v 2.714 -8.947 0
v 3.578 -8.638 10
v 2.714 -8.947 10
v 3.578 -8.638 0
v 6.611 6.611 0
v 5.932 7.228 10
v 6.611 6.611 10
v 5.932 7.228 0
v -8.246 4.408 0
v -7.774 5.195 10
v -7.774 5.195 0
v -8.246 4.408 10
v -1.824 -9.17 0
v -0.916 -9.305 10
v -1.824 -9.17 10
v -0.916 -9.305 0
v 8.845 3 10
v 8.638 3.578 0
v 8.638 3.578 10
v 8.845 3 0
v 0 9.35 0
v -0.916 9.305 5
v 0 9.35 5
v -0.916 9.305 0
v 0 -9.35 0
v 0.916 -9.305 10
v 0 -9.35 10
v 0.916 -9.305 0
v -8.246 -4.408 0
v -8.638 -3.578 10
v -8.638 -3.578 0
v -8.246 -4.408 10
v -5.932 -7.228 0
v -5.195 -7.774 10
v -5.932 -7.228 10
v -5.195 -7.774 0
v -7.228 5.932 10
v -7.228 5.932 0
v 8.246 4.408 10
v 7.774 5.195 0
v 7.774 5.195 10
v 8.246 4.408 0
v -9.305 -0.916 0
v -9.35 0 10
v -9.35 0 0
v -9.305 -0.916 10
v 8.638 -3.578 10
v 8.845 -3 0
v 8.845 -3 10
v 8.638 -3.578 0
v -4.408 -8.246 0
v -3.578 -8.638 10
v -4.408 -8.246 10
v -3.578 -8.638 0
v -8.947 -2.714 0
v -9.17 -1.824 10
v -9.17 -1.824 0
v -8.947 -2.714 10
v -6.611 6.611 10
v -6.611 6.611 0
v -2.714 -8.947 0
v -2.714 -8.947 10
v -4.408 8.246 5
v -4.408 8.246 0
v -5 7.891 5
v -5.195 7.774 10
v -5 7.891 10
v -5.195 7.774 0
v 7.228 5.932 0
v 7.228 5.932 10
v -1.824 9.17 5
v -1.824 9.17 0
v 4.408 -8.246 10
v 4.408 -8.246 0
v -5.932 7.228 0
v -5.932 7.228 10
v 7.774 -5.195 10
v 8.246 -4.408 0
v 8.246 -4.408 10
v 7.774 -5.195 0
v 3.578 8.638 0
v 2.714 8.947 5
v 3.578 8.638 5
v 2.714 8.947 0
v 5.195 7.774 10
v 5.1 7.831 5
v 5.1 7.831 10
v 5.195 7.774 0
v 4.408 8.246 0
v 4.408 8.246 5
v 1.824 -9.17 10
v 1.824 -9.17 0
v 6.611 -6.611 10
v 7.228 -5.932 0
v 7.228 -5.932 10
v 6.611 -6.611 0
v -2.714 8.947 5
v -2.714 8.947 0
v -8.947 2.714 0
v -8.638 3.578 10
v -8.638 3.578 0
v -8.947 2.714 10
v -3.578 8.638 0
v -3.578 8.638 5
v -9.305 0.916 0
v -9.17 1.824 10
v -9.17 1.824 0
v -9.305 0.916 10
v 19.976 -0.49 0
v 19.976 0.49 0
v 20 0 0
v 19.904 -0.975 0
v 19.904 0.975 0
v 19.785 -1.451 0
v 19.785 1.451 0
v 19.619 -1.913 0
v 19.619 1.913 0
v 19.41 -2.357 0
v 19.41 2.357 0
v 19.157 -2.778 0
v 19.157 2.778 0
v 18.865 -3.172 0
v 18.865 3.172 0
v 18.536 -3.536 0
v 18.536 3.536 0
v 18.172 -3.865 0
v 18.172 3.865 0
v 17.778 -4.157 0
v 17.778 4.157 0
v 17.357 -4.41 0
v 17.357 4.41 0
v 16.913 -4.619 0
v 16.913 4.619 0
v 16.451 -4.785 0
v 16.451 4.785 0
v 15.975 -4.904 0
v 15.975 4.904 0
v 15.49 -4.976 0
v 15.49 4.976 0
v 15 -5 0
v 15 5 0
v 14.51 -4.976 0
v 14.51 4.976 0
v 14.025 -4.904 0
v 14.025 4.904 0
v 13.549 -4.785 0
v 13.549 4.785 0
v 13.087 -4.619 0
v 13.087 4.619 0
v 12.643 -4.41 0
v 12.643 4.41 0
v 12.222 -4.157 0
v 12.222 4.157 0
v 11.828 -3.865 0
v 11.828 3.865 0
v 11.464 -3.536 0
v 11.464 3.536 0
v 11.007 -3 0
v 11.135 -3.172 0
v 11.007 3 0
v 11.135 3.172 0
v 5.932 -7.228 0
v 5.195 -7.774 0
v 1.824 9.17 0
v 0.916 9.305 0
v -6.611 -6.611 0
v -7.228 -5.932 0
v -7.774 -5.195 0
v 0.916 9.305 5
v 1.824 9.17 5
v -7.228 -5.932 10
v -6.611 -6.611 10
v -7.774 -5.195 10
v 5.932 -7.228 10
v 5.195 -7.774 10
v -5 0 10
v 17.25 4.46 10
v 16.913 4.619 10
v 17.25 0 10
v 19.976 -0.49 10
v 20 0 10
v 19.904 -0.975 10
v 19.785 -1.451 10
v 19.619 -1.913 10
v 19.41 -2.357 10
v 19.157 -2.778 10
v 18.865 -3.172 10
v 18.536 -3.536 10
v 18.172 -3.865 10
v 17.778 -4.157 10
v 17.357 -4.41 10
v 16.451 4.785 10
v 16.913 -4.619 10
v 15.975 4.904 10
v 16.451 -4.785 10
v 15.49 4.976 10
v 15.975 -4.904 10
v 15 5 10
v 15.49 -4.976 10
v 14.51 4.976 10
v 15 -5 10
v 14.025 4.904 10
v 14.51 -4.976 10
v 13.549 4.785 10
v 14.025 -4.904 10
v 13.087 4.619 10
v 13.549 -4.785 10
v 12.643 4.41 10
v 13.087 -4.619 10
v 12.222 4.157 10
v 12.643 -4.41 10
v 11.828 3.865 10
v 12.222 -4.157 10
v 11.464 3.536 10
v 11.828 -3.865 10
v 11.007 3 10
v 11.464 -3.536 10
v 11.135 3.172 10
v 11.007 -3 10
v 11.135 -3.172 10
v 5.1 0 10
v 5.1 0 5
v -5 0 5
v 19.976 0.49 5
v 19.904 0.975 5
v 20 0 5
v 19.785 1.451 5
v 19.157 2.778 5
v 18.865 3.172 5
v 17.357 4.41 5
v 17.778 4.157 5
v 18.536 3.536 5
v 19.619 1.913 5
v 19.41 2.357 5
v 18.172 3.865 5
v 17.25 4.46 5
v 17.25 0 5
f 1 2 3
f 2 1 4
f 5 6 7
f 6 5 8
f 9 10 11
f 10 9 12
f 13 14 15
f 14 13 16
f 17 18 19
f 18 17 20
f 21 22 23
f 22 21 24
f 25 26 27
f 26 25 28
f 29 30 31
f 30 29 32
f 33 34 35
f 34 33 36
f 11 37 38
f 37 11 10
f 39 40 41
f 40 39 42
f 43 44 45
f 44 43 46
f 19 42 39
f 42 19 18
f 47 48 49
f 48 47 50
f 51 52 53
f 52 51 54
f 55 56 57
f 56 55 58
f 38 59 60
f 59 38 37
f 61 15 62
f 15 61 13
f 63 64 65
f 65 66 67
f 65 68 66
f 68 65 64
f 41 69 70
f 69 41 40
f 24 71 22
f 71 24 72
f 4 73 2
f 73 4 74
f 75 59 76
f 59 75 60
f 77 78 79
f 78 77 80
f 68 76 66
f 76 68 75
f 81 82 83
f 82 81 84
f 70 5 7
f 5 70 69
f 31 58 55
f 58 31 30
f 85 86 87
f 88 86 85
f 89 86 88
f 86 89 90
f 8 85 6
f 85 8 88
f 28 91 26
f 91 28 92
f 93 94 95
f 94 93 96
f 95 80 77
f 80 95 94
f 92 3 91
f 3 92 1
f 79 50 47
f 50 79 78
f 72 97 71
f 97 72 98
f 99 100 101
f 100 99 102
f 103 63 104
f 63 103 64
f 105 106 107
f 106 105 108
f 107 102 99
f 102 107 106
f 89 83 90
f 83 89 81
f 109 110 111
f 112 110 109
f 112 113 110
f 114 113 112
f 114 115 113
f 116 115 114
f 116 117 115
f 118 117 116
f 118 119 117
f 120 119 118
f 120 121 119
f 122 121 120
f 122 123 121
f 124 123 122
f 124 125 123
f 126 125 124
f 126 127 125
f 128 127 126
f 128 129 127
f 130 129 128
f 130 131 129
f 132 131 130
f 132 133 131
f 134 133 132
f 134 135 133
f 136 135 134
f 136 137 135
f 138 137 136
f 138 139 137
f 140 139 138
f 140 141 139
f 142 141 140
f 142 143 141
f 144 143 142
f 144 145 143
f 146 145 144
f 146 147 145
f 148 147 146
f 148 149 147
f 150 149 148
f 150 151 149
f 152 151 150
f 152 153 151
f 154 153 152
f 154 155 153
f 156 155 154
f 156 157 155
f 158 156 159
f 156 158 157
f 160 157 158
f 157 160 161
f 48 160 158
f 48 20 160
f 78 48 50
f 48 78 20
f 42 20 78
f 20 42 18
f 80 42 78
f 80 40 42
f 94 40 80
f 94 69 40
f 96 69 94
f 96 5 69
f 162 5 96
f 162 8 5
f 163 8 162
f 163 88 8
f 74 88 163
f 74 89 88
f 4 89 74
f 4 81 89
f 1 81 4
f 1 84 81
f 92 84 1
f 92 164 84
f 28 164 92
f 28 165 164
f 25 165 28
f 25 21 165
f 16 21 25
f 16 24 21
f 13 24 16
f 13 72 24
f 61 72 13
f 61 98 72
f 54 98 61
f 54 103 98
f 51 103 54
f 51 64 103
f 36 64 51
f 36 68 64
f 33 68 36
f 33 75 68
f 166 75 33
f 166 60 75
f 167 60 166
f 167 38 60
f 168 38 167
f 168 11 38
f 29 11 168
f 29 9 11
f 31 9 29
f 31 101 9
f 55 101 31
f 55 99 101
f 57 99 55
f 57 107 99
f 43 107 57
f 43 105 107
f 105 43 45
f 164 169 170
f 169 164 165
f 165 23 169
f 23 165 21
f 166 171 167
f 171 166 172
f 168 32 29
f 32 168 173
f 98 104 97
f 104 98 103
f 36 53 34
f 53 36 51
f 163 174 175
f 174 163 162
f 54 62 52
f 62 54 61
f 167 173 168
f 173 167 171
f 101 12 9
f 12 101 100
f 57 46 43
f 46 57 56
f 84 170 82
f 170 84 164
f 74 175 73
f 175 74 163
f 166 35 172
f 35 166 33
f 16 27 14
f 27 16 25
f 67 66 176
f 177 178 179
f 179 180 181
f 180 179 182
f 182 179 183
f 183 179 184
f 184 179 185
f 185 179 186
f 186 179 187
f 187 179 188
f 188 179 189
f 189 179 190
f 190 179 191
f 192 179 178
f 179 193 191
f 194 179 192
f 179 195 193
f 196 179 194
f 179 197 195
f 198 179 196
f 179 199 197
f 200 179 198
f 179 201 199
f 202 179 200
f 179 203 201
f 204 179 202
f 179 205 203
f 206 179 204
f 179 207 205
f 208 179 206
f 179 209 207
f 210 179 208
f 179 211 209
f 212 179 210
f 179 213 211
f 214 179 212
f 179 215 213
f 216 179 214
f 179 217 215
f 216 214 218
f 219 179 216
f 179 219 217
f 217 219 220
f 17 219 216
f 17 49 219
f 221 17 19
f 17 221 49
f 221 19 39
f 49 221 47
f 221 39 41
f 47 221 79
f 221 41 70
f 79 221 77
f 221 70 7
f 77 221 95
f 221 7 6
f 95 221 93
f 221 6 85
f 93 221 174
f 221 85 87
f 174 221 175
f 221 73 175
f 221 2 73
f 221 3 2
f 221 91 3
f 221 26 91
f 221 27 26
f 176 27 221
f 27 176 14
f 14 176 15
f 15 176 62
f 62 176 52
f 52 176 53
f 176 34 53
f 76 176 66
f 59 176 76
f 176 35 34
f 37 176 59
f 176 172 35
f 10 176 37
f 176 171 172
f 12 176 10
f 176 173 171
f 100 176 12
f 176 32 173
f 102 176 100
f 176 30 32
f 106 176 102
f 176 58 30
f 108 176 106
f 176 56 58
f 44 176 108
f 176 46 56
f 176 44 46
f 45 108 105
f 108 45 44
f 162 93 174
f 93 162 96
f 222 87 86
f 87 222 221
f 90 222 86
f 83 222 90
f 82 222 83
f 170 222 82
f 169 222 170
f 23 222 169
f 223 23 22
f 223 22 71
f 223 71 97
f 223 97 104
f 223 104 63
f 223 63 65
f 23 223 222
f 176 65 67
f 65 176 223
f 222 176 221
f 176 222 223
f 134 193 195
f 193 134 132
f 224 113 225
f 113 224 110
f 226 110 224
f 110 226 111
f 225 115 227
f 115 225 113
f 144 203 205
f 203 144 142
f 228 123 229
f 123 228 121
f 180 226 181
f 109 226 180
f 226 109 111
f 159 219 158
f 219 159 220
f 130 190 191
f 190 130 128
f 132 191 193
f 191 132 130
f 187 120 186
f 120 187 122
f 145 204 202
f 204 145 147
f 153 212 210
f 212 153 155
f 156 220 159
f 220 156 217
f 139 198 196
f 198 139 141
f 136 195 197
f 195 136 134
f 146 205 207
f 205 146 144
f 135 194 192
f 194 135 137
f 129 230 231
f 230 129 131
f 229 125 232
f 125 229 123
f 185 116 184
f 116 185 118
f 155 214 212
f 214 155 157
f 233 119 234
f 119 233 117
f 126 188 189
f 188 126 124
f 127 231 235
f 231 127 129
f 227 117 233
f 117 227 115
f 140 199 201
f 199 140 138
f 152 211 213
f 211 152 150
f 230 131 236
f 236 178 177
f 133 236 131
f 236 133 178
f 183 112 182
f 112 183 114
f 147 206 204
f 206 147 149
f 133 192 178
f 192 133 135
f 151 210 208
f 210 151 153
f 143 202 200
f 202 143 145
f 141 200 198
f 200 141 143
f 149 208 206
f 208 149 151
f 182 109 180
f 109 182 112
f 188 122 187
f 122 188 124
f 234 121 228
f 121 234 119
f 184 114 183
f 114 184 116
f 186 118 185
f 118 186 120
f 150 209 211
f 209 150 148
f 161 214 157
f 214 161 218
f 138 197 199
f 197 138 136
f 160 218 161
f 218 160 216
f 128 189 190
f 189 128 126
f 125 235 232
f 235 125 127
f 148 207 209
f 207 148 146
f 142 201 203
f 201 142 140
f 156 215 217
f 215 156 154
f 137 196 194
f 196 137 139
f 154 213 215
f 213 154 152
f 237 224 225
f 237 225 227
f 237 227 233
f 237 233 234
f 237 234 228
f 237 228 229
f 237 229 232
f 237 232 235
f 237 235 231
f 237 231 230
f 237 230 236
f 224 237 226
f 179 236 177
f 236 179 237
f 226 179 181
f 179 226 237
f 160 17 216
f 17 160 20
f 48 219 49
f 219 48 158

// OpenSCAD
// Snap-on Clip for Lab Stand Rod and Tubing
// Orientation: Flat on XY plane, building up in +Z.
// Units: Millimetres.

// --- Dimensions ---
// Rod Stand Dimensions
$rod_diameter = 12.7;
$rod_wall_thickness = 3;
$rod_outer_diameter = $rod_diameter + 2 * $rod_wall_thickness; // 18.7
$rod_center = [0, 0];

// Tubing Dimensions
$tubing_diameter = 6;
$tubing_wall_thickness = 2;
$tubing_outer_diameter = $tubing_diameter + 2 * $tubing_wall_thickness; // 10
$tubing_center = [15, 0];

// Clip Geometry
$clip_height = 10;
$bridge_width_x = 4; // Distance between x=8 and x=12
$bridge_width_y = 6;
$opening_width_rod = 10;
$opening_width_tubing = 4.5;

// Extrusion settings
$fn = 64;

module rod_ring() {
    // Rod ring: 12.7mm ID, 3mm wall, centred at origin.
    // Opening cut: x < 0 and -5 < y < 5.
    
    // Main Ring
    difference() {
        // Extrude the full ring
        translate($rod_center)
        cylinder(h = $clip_height, d = $rod_outer_diameter, $fn = $fn);
        
        // Cut the opening on the -X side
        // Opening is 10mm wide, centred at y=0, so y goes from -5 to 5.
        // We cut a rectangle that extends slightly past the ring face to ensure clean cut.
        translate([-($opening_width_rod/2), 0, $clip_height/2])
        cube([
            $opening_width_rod + 0.1, // Extend past face
            $opening_width_rod,       // Height in Y (-5 to 5)
            $clip_height + 0.1         // Extend past top/bottom
        ]);
    }
}

module tubing_ring() {
    // Tubing ring: 6mm ID, 2mm wall, centred at x=15, y=0.
    // Opening cut: x > 15 and -2.25 < y < 2.25.
    
    difference() {
        // Extrude the full ring
        translate($tubing_center)
        cylinder(h = $clip_height, d = $tubing_outer_diameter, $fn = $fn);
        
        // Cut the opening on the +X side
        // Opening is 4.5mm wide, centred at y=0, so y goes from -2.25 to 2.25.
        translate([$tubing_center[0] + ($opening_width_tubing/2), 0, $clip_height/2])
        cube([
            $opening_width_tubing + 0.1, // Extend past face
            $opening_width_tubing,       // Height in Y
            $clip_height + 0.1           // Extend past top/bottom
        ]);
    }
}

module bridge() {
    // Solid bridge 6mm wide (Y) between x = 8 and x = 12.
    // Joins the two rings without blocking holes.
    
    translate([8, -($bridge_width_y/2), 0])
    cube([
        $bridge_width_x, // Width in X (12 - 8 = 4)
        $bridge_width_y, // Width in Y (6)
        $clip_height     // Height in Z
    ]);
}

// --- Main Assembly ---
difference() {
    union() {
        rod_ring();
        tubing_ring();
        bridge();
    }
    
    // Optional: Add a small support foot if needed, but user requested specific profile.
    // The profile described is self-supporting if printed flat on the "back" of the bridge.
    // However, to ensure it rests flat on the XY plane as requested ("rests on the XY plane"),
    // we assume the bridge bottom is the base. No subtraction needed for base unless specified.
}
